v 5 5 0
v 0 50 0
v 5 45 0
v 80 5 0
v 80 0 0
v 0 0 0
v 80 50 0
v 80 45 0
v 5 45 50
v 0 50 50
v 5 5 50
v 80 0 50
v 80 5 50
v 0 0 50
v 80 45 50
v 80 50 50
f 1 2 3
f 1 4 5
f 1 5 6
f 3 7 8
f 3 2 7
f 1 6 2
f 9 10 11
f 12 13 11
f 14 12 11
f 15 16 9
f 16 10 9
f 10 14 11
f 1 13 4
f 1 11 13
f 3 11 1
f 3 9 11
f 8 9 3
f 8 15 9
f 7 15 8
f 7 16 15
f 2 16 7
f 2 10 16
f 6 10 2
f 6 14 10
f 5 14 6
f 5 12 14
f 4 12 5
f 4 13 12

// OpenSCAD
$fn = 32;

// ----------------------------------------------------------------------
// Structural section: channel 80 x 50 mm
// ----------------------------------------------------------------------

// --- parameters (mm) ---
sec_w = 80;               // channel width, X
sec_h = 50;               // channel height, Y
flange_t = 5;             // flange thickness
web_t = 5;                // web thickness
plate_t = 50;             // cut length, Z (extrusion height)

profile = [[0, 0], [80, 0], [80, 5], [5, 5], [5, 45], [80, 45], [80, 50], [0, 50]];  // primary outline, 8 points, counter clockwise

// --- the one profile operation ---
linear_extrude(height = plate_t) polygon(points = profile);
